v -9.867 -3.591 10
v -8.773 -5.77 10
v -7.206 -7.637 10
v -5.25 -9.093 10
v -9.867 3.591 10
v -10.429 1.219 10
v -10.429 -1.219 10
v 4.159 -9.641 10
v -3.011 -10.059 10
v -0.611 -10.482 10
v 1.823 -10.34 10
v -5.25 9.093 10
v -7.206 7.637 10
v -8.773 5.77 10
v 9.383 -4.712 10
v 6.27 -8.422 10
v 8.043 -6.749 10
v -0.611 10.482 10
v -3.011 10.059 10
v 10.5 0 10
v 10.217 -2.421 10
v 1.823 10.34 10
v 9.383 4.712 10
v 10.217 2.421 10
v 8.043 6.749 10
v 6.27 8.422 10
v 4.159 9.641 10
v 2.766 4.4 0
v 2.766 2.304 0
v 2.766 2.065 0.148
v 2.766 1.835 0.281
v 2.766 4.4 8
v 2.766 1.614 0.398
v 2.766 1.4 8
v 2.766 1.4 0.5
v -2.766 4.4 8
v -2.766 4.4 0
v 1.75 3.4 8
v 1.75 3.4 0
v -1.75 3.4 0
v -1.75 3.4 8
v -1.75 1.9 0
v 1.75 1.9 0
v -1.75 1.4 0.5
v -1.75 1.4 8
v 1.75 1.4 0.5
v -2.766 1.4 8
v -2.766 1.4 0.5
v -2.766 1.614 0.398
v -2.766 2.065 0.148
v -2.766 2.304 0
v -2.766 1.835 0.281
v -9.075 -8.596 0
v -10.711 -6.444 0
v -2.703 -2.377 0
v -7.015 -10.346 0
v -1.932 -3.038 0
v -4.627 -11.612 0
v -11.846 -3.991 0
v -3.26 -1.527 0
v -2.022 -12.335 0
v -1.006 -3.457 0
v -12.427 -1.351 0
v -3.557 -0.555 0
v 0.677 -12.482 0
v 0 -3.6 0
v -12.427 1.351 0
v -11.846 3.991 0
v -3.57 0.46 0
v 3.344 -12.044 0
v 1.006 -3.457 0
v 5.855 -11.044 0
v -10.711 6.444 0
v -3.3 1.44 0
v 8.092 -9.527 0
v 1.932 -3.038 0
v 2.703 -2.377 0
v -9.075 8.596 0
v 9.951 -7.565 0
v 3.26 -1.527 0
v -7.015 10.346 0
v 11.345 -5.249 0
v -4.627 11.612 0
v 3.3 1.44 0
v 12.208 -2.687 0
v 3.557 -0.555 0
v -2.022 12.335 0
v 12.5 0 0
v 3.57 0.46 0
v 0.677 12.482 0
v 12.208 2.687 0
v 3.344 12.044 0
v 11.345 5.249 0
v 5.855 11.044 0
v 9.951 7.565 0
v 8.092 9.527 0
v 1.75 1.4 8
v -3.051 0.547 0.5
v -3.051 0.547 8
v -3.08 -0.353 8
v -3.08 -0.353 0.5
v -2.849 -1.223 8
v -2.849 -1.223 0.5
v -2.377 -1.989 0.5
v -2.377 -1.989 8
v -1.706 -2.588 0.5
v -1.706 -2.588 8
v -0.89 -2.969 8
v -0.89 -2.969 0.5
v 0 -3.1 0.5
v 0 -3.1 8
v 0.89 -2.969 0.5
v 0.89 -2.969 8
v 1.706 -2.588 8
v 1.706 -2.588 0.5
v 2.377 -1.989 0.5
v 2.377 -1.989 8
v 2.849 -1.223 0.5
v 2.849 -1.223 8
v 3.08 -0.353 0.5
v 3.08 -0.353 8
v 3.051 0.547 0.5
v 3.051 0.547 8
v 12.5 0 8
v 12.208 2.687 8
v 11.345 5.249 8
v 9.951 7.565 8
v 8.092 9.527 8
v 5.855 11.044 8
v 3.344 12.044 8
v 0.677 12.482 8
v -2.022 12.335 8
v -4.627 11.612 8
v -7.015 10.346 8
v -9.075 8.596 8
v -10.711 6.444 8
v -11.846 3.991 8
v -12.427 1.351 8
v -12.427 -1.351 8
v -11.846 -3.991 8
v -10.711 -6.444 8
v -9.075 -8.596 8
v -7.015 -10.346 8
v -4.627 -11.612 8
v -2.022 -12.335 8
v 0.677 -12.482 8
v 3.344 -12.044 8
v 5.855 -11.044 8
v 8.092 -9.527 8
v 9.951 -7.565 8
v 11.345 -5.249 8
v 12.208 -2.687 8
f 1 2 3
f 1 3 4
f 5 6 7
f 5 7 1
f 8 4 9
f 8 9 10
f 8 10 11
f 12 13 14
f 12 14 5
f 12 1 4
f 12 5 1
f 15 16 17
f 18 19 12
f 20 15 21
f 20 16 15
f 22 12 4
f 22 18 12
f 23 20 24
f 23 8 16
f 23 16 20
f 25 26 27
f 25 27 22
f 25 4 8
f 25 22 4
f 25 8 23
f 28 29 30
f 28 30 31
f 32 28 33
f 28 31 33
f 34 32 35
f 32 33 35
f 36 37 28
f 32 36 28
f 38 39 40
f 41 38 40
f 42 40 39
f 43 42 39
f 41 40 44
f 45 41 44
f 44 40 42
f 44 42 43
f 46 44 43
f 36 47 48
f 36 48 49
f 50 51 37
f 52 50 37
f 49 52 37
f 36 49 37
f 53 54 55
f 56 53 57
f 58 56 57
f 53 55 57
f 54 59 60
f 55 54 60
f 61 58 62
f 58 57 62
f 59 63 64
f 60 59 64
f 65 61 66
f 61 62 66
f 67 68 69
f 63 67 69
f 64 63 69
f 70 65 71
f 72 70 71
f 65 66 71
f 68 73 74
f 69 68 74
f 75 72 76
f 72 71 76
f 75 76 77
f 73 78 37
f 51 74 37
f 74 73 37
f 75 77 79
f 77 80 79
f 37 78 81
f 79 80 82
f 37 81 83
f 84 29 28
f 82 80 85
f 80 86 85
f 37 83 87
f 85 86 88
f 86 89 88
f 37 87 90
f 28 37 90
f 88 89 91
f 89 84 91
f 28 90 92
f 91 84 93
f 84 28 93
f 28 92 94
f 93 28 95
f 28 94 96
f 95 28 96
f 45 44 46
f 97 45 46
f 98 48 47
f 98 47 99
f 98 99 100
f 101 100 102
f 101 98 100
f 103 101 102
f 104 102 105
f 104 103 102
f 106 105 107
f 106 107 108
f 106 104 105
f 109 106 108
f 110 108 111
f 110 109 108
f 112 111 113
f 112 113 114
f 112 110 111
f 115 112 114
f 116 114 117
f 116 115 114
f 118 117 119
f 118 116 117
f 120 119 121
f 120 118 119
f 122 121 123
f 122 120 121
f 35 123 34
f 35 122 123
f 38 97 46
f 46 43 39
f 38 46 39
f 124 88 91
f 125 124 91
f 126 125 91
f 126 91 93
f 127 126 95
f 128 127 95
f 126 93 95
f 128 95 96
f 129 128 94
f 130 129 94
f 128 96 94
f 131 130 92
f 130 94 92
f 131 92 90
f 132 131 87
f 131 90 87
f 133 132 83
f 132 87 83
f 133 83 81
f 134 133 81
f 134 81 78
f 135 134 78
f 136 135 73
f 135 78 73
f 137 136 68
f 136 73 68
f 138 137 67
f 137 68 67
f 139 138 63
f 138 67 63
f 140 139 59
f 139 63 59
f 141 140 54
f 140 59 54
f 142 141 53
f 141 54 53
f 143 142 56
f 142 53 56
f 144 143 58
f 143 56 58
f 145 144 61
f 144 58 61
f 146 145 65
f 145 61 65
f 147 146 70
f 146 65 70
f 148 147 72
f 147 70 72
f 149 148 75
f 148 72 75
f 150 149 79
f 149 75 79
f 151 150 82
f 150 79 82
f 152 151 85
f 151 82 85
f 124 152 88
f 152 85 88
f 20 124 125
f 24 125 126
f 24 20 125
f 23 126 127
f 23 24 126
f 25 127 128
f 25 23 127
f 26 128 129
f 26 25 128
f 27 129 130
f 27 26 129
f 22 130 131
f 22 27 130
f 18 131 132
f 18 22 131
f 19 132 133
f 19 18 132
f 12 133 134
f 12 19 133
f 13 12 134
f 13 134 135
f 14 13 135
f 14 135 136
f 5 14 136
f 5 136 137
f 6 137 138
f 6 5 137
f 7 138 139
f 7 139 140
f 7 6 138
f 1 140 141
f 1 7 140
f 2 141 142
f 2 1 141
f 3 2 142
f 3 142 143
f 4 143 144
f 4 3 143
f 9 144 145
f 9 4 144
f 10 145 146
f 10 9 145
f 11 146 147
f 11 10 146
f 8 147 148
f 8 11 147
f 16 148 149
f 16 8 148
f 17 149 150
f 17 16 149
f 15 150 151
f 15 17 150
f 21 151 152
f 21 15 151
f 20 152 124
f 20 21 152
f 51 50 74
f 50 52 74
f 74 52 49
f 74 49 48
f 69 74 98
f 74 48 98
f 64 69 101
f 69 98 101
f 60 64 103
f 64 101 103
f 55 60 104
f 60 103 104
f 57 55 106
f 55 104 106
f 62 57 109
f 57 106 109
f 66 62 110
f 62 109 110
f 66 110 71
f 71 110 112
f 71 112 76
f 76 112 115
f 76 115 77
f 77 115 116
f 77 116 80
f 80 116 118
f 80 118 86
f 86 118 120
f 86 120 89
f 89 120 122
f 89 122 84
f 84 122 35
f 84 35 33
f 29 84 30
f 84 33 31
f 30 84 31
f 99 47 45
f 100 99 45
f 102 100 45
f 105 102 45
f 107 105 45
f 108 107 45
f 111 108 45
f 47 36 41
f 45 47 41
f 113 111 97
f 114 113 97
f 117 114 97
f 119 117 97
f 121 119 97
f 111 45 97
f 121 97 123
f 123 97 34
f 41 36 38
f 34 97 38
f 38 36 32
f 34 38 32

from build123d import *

# Parameters (mm, degrees)
SKETCH_R        = 12.5
PAD_DEPTH       = 10
POCKET_DEPTH    = 8
CHAMFER_SIZE    = 2
POCKET001_DEPTH = 8
CHAMFER001_SIZE = 0.5


with BuildPart() as part:
    # Sketch → Pad (new body)
    with BuildSketch(Plane.XY):
        Circle(SKETCH_R)
    extrude(amount=PAD_DEPTH)

    # Sketch001 → Pocket (cut)
    with BuildSketch(Plane.XY):
        with BuildLine():
            ThreePointArc((-2.765863, 1.4), (0, -3.1), (2.765863, 1.4))
            Line((-2.765863, 1.4), (2.765863, 1.4))
        make_face()
    extrude(amount=POCKET_DEPTH, mode=Mode.SUBTRACT)

    # Chamfer
    chamfer_edges = [part.edges().sort_by_distance(p)[0] for p in [
        (-12.5, 0, 10),
    ]]
    chamfer(chamfer_edges, length=CHAMFER_SIZE)

    # Sketch002 → Pocket001 (cut)
    with BuildSketch(Plane.XY):
        Polygon((1.75, 1.4), (1.75, 3.4), (-1.75, 3.4), (-1.75, 1.4), (-2.765863, 1.4), (-2.765863, 4.4), (2.765863, 4.4), (2.765863, 1.4), align=None)
    extrude(amount=POCKET001_DEPTH, mode=Mode.SUBTRACT)

    # Chamfer001
    chamfer001_edges = [part.edges().sort_by_distance(p)[0] for p in [
        (0, -3.1, 0),
        (0, 1.4, 0),
    ]]
    chamfer(chamfer001_edges, length=CHAMFER001_SIZE)


solid = part.part
